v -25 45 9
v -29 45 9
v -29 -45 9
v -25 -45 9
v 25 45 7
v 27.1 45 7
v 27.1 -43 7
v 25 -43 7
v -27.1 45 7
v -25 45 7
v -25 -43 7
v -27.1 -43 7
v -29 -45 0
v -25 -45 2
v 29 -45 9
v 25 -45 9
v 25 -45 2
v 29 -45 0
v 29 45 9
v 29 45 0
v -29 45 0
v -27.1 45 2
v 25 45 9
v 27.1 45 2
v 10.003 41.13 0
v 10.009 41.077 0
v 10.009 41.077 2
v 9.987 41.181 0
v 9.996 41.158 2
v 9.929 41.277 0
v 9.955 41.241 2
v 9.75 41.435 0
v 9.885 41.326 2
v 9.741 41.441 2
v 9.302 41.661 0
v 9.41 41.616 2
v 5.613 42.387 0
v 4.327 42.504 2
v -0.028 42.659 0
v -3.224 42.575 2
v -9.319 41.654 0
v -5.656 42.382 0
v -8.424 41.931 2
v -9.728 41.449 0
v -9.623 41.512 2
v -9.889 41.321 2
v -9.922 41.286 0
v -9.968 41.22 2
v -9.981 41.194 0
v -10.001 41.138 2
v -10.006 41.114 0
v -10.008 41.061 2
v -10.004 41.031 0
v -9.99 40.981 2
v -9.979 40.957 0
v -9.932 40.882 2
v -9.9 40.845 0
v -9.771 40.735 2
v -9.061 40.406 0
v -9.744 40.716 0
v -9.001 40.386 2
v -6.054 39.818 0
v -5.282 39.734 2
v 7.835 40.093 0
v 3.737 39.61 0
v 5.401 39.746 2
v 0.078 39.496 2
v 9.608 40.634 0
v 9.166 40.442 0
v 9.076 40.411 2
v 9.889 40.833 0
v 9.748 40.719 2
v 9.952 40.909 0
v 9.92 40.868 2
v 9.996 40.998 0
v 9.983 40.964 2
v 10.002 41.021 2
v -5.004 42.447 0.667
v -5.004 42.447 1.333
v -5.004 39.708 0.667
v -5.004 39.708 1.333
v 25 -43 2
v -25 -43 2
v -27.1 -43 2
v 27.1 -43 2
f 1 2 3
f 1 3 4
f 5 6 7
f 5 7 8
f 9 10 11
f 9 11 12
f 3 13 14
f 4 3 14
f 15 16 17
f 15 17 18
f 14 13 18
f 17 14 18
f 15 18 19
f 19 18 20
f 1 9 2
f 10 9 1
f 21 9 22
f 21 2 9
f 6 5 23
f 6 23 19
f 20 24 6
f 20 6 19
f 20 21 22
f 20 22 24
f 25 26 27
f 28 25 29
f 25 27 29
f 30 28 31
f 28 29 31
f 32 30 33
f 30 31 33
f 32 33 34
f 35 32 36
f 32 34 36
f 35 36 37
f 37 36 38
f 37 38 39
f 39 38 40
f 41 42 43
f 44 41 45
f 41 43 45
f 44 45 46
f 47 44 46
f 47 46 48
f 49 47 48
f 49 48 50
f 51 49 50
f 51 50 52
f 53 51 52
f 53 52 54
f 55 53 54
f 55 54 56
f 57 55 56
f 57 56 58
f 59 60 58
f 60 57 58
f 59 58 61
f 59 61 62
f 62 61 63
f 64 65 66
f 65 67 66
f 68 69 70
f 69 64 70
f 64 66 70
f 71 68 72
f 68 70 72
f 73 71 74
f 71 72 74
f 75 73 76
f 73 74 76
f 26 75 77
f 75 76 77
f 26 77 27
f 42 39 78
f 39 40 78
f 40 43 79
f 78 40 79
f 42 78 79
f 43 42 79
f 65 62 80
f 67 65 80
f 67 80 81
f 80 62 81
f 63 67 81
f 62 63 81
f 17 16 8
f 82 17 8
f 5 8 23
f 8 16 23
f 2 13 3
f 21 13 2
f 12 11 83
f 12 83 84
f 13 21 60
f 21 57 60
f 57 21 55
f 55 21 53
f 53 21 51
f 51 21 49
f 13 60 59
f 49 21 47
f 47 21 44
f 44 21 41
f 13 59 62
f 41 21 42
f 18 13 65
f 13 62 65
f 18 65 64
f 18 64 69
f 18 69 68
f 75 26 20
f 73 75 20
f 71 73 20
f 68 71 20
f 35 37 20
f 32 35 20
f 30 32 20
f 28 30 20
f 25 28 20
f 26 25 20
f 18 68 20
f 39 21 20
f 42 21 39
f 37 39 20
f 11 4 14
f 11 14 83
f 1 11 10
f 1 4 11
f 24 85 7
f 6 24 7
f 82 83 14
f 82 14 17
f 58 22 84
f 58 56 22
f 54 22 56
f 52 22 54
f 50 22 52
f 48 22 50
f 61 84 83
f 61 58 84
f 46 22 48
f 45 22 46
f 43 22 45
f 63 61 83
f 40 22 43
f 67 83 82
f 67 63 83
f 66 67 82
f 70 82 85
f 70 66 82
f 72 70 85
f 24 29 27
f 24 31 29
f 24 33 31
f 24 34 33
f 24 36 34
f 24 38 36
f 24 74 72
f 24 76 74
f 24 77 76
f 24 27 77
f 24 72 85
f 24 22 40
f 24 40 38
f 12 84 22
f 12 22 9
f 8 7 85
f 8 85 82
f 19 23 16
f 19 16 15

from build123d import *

# Parameters (mm, degrees)
F0_W     = 58
F0_H     = 90
F1_DEPTH = 9
F2_W     = 50
F2_H     = 90
F3_DEPTH = 7
F4_W     = 54.2
F4_H     = 5
F5_DEPTH = 88
F7_DEPTH = 25


# Not quite as in the source:
# - a feature names something its author has since deleted; it is built from what else it names


with BuildPart() as f1:
    # F0 (on Top) → F1 (new body)
    with BuildSketch(Plane.XY):
        Rectangle(F0_W, F0_H)
    extrude(amount=F1_DEPTH)

    # F2 (on face) → F3 (cut)
    with BuildSketch(Plane.XY.offset(9)):
        Rectangle(F2_W, F2_H)
    extrude(amount=-F3_DEPTH, mode=Mode.SUBTRACT)

    # F4 (on face) → F5 (cut)
    with BuildSketch(Plane(origin=(0, 45, 0), x_dir=(-1, 0, 0), z_dir=(0, 1, 0))):
        with Locations((0, 4.5)):
            Rectangle(F4_W, F4_H)
    extrude(amount=-F5_DEPTH, mode=Mode.SUBTRACT)

    # F6 (on face) → F7 (cut)
    with BuildSketch(Plane.XY.offset(2)):
        with BuildLine():
            add(Edge.make_bspline(
                [(10.0087067112, 41.0774275661), (10.0087067112, 43.8166453426), (-5.0043533556, 42.4470364543), (-20.0174134225, 41.0774275661), (-5.0043533556, 39.7078186778), (10.0087067112, 38.3382097895), (10.0087067112, 41.0774275661)],
                knots=[0, 0, 0, 2.0943951024, 2.0943951024, 4.1887902048, 4.1887902048, 6.2831853072, 6.2831853072, 6.2831853072], degree=2, weights=[1, 0.5, 1, 0.5, 1, 0.5, 1]))
        make_face()
    extrude(amount=-F7_DEPTH, mode=Mode.SUBTRACT)


solid = f1.part
